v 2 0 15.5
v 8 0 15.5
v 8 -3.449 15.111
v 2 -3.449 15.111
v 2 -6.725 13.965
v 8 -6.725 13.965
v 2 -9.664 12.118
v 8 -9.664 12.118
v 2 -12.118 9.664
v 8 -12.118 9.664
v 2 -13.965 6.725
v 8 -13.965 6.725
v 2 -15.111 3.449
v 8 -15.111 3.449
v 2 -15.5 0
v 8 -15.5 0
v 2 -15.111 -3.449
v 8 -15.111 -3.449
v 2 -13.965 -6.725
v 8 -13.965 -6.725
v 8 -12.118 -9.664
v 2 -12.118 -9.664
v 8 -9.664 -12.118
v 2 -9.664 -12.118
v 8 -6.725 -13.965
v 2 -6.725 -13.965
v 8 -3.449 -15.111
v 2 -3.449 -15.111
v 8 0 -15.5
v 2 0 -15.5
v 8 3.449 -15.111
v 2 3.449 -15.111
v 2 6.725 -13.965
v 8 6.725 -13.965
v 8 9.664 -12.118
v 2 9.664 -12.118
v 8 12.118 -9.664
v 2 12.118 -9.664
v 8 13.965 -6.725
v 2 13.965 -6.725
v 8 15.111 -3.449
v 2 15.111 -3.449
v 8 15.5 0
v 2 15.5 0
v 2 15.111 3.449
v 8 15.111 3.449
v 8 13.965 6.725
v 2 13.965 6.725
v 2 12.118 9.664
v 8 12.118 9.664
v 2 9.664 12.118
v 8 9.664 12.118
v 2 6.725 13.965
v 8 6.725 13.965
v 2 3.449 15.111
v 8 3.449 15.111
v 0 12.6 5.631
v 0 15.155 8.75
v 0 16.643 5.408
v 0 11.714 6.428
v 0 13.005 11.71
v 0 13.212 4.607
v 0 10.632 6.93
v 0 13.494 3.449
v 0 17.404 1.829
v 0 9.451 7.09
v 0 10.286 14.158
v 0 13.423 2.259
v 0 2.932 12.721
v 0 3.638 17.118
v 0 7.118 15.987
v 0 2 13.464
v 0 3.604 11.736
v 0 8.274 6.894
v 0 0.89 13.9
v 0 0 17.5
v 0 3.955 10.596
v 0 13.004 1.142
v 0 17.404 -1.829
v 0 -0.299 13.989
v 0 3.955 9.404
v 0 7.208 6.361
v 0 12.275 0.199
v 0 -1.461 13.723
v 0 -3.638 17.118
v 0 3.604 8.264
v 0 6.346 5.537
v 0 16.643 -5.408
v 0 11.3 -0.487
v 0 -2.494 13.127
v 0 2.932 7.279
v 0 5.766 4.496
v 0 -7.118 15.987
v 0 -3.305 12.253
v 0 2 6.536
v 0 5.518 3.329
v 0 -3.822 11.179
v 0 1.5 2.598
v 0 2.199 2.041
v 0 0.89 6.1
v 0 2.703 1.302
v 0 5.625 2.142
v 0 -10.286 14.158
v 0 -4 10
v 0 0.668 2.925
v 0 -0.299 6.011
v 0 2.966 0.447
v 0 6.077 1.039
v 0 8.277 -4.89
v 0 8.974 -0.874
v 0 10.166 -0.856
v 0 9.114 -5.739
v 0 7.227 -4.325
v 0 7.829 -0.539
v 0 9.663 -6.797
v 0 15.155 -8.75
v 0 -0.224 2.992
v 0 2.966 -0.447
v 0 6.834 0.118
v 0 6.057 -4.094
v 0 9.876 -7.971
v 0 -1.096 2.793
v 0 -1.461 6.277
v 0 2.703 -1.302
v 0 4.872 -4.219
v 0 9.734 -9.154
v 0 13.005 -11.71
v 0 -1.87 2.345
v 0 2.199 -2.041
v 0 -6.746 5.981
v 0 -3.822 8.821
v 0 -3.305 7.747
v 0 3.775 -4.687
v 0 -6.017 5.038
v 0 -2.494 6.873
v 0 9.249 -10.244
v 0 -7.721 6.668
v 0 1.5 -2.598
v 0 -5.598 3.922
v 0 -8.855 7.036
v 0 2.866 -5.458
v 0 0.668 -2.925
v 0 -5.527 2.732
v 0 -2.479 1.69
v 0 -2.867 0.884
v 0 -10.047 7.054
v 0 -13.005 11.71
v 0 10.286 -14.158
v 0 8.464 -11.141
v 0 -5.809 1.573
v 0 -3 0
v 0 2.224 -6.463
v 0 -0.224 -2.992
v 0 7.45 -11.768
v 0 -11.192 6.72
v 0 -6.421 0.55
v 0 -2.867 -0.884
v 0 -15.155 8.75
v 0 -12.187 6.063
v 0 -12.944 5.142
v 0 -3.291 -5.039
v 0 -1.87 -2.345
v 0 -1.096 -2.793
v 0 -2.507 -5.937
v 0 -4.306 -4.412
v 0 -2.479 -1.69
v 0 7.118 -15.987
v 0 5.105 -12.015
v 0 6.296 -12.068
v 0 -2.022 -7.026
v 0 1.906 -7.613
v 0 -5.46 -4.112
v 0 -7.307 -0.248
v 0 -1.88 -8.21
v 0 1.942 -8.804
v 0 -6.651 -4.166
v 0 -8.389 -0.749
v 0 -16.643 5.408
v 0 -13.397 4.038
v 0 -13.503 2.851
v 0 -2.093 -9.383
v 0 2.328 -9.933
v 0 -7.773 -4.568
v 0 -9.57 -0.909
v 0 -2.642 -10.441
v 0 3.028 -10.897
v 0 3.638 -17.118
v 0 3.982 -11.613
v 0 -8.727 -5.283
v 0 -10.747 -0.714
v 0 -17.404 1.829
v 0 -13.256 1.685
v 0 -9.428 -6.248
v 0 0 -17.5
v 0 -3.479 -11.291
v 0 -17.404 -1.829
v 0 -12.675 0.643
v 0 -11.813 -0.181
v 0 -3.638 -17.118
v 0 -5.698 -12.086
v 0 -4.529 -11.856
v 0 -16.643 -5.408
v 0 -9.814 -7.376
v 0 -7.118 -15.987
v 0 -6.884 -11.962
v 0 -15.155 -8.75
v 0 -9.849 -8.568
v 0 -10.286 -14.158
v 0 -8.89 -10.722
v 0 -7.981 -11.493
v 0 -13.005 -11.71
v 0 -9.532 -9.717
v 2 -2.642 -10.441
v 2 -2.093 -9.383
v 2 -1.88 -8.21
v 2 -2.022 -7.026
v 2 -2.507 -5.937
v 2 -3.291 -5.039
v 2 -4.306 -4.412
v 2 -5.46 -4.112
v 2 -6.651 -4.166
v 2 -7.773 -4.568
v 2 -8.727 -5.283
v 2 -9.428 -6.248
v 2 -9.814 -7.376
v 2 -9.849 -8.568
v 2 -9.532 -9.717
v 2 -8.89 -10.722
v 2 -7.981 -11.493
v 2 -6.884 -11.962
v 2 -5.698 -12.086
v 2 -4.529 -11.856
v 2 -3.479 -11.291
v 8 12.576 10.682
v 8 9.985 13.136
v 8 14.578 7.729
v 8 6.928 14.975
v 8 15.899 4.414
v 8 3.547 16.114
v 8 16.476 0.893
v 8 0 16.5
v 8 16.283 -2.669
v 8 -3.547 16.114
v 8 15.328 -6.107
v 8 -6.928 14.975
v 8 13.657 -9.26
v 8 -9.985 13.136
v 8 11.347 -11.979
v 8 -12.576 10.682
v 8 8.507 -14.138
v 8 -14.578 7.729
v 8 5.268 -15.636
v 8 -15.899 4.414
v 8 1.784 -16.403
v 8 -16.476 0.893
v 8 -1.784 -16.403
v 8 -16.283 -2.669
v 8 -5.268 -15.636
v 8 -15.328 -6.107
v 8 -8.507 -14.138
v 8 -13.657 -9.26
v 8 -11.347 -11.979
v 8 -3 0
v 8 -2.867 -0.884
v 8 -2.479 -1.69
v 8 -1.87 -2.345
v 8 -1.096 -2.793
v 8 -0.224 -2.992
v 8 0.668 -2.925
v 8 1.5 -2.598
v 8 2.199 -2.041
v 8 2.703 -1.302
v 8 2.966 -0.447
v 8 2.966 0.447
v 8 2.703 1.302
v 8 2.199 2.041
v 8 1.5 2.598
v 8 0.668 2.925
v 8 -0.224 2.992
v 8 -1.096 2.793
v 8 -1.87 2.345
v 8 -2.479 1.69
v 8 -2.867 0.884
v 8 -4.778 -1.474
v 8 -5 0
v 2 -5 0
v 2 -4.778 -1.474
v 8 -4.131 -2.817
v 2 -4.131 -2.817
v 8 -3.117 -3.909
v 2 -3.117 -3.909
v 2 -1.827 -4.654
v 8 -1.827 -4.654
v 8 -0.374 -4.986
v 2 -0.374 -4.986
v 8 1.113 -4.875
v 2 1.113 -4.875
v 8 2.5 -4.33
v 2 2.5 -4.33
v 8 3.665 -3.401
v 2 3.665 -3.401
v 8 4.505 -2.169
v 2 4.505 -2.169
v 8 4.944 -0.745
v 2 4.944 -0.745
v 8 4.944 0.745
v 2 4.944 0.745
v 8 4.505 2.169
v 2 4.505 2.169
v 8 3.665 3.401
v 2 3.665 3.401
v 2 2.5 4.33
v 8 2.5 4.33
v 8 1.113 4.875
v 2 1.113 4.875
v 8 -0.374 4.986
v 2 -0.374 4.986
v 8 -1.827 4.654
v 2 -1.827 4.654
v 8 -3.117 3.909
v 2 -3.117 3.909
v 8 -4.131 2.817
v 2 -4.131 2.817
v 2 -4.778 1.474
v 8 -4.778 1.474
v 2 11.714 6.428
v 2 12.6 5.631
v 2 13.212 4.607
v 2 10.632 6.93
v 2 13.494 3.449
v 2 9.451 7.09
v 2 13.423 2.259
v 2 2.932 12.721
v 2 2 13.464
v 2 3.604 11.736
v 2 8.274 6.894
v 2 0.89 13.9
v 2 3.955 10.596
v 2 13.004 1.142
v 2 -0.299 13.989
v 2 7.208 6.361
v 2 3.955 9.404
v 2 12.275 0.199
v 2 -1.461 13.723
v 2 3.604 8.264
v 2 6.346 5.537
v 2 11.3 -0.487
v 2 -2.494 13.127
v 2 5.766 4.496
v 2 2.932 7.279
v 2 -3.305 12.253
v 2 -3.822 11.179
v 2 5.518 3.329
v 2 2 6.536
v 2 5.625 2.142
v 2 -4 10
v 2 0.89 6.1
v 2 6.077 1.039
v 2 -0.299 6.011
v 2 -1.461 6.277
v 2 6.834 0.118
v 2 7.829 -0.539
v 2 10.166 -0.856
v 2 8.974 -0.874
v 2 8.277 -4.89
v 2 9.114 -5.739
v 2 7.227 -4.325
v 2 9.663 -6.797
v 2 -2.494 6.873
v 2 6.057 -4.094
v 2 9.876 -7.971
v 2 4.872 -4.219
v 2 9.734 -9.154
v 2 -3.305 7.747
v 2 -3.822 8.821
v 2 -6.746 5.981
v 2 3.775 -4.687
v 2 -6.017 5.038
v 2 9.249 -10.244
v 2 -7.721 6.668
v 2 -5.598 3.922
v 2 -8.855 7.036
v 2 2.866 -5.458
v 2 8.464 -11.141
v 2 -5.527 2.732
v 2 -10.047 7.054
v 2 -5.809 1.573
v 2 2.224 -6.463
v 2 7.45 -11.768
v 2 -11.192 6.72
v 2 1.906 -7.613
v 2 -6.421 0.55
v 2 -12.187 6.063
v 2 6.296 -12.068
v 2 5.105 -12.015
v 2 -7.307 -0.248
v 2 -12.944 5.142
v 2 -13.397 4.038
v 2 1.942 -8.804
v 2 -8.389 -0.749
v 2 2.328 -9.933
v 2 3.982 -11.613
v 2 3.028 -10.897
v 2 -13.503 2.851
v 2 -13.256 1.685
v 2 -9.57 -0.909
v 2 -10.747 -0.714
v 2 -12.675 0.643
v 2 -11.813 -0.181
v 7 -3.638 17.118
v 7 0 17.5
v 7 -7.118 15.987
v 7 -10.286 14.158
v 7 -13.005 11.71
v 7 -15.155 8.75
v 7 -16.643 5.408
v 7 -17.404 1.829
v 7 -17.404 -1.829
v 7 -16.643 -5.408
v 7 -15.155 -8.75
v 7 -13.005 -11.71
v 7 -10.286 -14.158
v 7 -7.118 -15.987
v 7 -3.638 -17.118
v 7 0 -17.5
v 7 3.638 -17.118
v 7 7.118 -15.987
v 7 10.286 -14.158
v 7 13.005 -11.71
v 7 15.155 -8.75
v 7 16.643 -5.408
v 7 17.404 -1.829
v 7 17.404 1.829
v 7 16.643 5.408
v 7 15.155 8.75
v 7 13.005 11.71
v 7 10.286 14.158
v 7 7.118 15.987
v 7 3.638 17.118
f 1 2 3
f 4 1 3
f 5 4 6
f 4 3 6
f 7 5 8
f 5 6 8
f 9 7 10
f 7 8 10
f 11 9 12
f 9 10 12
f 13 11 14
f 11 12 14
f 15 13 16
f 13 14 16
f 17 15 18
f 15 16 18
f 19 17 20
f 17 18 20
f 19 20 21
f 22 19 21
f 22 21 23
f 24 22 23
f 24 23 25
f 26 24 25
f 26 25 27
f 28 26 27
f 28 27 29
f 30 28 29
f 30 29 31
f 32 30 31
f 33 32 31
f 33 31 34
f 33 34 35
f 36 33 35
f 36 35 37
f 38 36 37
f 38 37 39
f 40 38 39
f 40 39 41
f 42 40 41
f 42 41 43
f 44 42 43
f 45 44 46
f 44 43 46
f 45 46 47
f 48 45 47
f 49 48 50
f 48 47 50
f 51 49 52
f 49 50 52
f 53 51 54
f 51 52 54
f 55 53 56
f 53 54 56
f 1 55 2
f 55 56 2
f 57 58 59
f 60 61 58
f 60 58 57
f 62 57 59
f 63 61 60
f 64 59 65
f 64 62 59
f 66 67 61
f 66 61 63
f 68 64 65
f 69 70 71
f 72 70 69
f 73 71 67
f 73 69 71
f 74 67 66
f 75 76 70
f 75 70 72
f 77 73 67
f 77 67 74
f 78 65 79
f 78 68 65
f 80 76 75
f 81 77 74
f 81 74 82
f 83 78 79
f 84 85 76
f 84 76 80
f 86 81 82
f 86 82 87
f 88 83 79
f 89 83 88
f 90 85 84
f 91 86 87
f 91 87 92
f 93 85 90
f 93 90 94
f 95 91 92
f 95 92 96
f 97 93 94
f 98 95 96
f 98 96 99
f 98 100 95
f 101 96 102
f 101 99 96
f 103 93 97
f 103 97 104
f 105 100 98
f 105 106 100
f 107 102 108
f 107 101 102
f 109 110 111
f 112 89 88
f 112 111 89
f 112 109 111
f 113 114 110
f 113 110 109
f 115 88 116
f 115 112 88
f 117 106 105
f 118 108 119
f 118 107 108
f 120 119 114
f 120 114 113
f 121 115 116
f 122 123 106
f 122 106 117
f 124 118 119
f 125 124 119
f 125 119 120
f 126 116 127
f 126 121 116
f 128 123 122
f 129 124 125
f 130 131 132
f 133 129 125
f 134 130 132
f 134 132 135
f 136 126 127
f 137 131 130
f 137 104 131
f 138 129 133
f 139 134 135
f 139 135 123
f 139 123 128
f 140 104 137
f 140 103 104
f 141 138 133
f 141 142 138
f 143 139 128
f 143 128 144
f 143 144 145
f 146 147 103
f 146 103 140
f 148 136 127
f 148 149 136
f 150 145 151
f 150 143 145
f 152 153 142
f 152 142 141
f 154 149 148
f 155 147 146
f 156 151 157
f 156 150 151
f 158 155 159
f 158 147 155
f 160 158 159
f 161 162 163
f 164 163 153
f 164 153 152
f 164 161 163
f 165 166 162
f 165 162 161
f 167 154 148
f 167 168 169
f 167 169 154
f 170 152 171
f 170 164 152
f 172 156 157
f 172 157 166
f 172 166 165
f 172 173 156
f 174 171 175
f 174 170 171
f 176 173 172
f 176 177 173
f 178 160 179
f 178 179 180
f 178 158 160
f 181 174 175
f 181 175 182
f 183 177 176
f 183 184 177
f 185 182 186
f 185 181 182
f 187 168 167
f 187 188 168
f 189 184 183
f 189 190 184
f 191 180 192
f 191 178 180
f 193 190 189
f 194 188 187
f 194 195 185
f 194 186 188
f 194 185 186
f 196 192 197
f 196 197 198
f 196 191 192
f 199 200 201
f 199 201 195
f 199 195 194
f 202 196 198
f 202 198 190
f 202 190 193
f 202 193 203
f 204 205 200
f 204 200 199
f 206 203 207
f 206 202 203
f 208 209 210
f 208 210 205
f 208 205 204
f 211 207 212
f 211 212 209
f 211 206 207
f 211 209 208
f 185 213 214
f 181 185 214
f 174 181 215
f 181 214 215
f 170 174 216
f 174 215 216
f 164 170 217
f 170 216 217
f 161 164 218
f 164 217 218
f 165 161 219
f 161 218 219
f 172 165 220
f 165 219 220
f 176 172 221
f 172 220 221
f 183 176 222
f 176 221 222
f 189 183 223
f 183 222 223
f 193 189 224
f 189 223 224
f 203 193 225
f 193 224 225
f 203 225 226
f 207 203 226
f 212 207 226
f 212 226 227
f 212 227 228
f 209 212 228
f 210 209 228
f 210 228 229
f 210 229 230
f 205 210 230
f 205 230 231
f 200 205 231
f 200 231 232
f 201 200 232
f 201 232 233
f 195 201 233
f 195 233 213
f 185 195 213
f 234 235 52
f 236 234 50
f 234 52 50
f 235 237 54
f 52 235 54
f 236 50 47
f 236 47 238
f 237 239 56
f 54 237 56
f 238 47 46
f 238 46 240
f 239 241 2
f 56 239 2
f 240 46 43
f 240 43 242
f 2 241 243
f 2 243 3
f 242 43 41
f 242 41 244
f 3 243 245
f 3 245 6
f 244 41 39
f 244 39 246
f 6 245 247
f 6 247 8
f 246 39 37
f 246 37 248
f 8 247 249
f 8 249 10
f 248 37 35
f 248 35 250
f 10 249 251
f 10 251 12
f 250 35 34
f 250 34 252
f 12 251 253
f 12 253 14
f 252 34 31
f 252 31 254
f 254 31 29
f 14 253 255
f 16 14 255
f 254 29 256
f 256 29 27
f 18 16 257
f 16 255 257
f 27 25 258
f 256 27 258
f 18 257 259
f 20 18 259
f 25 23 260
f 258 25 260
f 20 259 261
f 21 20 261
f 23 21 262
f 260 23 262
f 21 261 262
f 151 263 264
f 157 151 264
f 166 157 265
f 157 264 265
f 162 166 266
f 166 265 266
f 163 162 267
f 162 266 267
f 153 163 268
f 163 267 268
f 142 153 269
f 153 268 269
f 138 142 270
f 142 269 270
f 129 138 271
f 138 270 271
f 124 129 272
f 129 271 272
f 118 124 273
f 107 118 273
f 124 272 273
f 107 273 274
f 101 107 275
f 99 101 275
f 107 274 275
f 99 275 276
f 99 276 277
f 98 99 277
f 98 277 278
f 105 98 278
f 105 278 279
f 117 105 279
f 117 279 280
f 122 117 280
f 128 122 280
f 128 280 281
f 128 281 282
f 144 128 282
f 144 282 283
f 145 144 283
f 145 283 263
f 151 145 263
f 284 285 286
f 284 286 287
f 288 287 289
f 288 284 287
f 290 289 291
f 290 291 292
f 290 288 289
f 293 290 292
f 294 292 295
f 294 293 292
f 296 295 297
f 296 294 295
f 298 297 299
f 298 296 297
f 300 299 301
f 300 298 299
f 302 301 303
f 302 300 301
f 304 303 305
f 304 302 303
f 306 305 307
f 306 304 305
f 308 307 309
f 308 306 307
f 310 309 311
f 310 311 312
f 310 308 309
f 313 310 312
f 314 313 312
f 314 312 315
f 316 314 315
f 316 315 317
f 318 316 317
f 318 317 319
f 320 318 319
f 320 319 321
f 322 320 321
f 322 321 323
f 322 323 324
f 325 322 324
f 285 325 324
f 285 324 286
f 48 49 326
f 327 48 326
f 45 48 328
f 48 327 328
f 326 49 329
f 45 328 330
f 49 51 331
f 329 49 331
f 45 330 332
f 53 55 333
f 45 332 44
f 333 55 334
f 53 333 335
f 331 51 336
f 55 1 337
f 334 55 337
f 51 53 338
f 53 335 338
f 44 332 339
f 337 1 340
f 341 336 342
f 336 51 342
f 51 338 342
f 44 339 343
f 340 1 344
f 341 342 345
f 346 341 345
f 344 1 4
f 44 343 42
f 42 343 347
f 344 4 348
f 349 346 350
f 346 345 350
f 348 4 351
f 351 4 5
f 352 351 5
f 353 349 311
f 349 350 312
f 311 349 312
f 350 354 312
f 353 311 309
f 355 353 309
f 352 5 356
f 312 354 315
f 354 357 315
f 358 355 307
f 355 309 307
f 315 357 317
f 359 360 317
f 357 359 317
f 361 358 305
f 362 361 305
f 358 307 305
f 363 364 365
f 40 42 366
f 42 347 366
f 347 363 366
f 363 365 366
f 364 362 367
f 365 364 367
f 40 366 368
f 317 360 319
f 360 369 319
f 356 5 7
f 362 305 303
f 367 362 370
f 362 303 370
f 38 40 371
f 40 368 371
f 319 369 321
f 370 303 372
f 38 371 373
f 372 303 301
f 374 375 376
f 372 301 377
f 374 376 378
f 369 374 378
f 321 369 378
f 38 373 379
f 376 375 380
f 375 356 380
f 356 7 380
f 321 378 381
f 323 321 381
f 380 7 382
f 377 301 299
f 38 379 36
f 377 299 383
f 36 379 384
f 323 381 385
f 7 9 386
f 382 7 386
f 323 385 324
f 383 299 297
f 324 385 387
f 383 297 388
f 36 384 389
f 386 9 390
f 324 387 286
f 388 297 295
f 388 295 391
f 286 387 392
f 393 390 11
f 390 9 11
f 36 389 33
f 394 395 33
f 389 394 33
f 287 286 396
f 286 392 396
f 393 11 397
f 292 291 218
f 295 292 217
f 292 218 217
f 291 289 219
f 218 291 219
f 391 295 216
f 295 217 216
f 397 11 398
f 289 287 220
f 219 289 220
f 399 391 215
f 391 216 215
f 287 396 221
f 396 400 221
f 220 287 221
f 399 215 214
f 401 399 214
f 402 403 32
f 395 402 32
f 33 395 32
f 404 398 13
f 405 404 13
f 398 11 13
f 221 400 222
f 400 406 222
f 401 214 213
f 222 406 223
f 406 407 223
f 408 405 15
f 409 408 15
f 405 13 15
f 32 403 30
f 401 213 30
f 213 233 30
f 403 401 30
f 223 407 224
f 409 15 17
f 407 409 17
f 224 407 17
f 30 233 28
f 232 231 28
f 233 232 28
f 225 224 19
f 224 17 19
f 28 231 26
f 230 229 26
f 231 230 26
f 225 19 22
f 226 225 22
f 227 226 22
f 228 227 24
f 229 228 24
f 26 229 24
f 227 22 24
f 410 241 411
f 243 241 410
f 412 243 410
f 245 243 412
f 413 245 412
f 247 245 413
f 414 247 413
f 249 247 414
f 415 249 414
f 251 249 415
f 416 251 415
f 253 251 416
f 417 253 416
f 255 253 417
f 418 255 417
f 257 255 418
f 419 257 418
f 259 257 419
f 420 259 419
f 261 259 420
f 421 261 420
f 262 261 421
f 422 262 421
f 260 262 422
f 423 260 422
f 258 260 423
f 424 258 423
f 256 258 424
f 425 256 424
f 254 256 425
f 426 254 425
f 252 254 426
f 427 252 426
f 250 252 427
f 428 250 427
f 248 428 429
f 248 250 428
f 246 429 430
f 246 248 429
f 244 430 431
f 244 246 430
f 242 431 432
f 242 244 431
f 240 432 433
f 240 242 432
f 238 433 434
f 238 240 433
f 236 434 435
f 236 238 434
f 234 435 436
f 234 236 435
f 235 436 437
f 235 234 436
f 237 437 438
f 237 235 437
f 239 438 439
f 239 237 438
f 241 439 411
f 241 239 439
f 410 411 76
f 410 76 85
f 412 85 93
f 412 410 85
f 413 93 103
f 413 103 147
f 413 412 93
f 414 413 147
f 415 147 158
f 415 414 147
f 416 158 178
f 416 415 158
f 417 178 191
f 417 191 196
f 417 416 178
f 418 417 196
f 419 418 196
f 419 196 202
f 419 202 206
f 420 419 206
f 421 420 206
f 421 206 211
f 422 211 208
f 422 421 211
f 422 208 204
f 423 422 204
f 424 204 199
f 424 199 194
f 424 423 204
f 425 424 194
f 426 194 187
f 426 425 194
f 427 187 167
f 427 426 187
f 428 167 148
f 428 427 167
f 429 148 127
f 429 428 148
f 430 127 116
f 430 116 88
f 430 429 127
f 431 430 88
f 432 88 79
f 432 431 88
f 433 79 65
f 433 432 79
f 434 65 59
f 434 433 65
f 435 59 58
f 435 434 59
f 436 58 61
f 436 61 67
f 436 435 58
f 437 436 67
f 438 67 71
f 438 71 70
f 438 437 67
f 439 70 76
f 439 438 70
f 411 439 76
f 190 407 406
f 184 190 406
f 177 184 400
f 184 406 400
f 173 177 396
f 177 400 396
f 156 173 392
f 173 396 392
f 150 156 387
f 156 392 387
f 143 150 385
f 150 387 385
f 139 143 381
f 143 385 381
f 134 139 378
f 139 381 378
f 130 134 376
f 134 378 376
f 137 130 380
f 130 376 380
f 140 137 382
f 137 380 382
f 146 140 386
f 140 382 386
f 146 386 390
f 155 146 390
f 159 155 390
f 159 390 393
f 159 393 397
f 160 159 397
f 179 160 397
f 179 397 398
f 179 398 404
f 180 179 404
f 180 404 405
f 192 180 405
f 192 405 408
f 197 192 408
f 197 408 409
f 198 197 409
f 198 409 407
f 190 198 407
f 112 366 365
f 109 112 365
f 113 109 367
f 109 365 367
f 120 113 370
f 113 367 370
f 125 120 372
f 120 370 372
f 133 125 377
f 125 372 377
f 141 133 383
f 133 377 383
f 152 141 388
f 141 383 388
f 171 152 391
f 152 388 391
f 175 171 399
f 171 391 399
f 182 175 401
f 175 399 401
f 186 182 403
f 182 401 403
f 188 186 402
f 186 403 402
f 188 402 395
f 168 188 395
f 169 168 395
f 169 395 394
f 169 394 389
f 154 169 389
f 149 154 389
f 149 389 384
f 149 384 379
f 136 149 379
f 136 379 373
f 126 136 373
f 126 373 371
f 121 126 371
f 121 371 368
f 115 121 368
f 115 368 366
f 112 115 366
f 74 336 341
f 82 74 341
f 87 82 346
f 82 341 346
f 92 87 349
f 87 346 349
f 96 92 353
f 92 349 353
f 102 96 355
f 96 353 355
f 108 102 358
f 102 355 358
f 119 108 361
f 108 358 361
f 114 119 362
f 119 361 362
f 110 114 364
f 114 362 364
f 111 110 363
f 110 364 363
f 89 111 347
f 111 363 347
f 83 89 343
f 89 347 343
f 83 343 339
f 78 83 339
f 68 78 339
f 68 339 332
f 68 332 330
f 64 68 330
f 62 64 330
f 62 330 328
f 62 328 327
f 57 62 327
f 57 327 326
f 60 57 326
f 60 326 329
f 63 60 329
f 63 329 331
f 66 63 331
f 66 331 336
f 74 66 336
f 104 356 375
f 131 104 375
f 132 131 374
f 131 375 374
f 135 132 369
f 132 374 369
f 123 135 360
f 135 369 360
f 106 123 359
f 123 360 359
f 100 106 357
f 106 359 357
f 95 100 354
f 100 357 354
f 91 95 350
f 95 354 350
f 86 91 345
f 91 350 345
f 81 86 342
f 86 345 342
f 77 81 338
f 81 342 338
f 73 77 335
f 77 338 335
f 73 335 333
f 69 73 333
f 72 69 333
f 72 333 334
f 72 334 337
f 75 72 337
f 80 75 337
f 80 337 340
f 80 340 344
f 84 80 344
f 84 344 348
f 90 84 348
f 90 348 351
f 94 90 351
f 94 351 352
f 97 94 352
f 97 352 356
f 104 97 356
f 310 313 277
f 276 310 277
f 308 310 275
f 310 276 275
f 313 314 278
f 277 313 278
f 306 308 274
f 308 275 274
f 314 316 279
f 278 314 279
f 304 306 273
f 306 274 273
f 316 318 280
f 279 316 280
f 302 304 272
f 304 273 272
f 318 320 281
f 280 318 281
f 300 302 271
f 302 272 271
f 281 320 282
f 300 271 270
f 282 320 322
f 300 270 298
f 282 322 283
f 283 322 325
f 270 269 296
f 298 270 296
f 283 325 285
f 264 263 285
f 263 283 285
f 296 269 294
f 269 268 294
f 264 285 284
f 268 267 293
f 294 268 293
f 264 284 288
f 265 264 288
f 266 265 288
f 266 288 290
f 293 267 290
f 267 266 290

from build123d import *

# Parameters (mm, degrees)
F0_W            = 8
F0_H            = 17.5
F3_D            = 6
F4_T            = -2
F6_D            = 8
F6_COPIES_COUNT = 5
F7_SIZE         = 1


# Not quite as in the source:
# - a pattern or mirror of a feature is missing from the dataset's text; its kind, count and spacing are read off the source's solid


with BuildPart() as f1:
    # F0 (on Front) → F1 (revolve)
    with BuildSketch(Plane.XZ):
        with Locations((4, 8.75)):
            Rectangle(F0_W, F0_H)
    revolve(axis=Axis((4, 0, 0), (1, 0, 0)))

    # F3 (through all)
    with Locations(Plane(origin=(0, 0, 0), x_dir=(0, 1, 0), z_dir=(-1, 0, 0))):
        with Locations((0, 0)):
            Hole(F3_D / 2)

    # F4
    f4_openings = [f1.faces().sort_by_distance(p)[0] for p in [
        (8, 0, -17.005025),
    ]]
    offset(amount=F4_T, openings=f4_openings)

    # F6 (through all)
    with Locations(Plane(origin=(0, 0, 0), x_dir=(0, 1, 0), z_dir=(-1, 0, 0))):
        with Locations((0, -10)):
            f6 = Hole(F6_D / 2)

    # F6_copies: F6 ×5 about axis
    f6_copies_axis = Axis((0, 0, 0), (1, 0, 0))
    for i in range(1, F6_COPIES_COUNT):
        add(f6.rotate(f6_copies_axis, i * 360 / F6_COPIES_COUNT), mode=Mode.SUBTRACT)

    # F7
    f7_edges = [f1.edges().sort_by_distance(p)[0] for p in [
        (8, 0, -17.5),
    ]]
    chamfer(f7_edges, length=F7_SIZE)


solid = f1.part
